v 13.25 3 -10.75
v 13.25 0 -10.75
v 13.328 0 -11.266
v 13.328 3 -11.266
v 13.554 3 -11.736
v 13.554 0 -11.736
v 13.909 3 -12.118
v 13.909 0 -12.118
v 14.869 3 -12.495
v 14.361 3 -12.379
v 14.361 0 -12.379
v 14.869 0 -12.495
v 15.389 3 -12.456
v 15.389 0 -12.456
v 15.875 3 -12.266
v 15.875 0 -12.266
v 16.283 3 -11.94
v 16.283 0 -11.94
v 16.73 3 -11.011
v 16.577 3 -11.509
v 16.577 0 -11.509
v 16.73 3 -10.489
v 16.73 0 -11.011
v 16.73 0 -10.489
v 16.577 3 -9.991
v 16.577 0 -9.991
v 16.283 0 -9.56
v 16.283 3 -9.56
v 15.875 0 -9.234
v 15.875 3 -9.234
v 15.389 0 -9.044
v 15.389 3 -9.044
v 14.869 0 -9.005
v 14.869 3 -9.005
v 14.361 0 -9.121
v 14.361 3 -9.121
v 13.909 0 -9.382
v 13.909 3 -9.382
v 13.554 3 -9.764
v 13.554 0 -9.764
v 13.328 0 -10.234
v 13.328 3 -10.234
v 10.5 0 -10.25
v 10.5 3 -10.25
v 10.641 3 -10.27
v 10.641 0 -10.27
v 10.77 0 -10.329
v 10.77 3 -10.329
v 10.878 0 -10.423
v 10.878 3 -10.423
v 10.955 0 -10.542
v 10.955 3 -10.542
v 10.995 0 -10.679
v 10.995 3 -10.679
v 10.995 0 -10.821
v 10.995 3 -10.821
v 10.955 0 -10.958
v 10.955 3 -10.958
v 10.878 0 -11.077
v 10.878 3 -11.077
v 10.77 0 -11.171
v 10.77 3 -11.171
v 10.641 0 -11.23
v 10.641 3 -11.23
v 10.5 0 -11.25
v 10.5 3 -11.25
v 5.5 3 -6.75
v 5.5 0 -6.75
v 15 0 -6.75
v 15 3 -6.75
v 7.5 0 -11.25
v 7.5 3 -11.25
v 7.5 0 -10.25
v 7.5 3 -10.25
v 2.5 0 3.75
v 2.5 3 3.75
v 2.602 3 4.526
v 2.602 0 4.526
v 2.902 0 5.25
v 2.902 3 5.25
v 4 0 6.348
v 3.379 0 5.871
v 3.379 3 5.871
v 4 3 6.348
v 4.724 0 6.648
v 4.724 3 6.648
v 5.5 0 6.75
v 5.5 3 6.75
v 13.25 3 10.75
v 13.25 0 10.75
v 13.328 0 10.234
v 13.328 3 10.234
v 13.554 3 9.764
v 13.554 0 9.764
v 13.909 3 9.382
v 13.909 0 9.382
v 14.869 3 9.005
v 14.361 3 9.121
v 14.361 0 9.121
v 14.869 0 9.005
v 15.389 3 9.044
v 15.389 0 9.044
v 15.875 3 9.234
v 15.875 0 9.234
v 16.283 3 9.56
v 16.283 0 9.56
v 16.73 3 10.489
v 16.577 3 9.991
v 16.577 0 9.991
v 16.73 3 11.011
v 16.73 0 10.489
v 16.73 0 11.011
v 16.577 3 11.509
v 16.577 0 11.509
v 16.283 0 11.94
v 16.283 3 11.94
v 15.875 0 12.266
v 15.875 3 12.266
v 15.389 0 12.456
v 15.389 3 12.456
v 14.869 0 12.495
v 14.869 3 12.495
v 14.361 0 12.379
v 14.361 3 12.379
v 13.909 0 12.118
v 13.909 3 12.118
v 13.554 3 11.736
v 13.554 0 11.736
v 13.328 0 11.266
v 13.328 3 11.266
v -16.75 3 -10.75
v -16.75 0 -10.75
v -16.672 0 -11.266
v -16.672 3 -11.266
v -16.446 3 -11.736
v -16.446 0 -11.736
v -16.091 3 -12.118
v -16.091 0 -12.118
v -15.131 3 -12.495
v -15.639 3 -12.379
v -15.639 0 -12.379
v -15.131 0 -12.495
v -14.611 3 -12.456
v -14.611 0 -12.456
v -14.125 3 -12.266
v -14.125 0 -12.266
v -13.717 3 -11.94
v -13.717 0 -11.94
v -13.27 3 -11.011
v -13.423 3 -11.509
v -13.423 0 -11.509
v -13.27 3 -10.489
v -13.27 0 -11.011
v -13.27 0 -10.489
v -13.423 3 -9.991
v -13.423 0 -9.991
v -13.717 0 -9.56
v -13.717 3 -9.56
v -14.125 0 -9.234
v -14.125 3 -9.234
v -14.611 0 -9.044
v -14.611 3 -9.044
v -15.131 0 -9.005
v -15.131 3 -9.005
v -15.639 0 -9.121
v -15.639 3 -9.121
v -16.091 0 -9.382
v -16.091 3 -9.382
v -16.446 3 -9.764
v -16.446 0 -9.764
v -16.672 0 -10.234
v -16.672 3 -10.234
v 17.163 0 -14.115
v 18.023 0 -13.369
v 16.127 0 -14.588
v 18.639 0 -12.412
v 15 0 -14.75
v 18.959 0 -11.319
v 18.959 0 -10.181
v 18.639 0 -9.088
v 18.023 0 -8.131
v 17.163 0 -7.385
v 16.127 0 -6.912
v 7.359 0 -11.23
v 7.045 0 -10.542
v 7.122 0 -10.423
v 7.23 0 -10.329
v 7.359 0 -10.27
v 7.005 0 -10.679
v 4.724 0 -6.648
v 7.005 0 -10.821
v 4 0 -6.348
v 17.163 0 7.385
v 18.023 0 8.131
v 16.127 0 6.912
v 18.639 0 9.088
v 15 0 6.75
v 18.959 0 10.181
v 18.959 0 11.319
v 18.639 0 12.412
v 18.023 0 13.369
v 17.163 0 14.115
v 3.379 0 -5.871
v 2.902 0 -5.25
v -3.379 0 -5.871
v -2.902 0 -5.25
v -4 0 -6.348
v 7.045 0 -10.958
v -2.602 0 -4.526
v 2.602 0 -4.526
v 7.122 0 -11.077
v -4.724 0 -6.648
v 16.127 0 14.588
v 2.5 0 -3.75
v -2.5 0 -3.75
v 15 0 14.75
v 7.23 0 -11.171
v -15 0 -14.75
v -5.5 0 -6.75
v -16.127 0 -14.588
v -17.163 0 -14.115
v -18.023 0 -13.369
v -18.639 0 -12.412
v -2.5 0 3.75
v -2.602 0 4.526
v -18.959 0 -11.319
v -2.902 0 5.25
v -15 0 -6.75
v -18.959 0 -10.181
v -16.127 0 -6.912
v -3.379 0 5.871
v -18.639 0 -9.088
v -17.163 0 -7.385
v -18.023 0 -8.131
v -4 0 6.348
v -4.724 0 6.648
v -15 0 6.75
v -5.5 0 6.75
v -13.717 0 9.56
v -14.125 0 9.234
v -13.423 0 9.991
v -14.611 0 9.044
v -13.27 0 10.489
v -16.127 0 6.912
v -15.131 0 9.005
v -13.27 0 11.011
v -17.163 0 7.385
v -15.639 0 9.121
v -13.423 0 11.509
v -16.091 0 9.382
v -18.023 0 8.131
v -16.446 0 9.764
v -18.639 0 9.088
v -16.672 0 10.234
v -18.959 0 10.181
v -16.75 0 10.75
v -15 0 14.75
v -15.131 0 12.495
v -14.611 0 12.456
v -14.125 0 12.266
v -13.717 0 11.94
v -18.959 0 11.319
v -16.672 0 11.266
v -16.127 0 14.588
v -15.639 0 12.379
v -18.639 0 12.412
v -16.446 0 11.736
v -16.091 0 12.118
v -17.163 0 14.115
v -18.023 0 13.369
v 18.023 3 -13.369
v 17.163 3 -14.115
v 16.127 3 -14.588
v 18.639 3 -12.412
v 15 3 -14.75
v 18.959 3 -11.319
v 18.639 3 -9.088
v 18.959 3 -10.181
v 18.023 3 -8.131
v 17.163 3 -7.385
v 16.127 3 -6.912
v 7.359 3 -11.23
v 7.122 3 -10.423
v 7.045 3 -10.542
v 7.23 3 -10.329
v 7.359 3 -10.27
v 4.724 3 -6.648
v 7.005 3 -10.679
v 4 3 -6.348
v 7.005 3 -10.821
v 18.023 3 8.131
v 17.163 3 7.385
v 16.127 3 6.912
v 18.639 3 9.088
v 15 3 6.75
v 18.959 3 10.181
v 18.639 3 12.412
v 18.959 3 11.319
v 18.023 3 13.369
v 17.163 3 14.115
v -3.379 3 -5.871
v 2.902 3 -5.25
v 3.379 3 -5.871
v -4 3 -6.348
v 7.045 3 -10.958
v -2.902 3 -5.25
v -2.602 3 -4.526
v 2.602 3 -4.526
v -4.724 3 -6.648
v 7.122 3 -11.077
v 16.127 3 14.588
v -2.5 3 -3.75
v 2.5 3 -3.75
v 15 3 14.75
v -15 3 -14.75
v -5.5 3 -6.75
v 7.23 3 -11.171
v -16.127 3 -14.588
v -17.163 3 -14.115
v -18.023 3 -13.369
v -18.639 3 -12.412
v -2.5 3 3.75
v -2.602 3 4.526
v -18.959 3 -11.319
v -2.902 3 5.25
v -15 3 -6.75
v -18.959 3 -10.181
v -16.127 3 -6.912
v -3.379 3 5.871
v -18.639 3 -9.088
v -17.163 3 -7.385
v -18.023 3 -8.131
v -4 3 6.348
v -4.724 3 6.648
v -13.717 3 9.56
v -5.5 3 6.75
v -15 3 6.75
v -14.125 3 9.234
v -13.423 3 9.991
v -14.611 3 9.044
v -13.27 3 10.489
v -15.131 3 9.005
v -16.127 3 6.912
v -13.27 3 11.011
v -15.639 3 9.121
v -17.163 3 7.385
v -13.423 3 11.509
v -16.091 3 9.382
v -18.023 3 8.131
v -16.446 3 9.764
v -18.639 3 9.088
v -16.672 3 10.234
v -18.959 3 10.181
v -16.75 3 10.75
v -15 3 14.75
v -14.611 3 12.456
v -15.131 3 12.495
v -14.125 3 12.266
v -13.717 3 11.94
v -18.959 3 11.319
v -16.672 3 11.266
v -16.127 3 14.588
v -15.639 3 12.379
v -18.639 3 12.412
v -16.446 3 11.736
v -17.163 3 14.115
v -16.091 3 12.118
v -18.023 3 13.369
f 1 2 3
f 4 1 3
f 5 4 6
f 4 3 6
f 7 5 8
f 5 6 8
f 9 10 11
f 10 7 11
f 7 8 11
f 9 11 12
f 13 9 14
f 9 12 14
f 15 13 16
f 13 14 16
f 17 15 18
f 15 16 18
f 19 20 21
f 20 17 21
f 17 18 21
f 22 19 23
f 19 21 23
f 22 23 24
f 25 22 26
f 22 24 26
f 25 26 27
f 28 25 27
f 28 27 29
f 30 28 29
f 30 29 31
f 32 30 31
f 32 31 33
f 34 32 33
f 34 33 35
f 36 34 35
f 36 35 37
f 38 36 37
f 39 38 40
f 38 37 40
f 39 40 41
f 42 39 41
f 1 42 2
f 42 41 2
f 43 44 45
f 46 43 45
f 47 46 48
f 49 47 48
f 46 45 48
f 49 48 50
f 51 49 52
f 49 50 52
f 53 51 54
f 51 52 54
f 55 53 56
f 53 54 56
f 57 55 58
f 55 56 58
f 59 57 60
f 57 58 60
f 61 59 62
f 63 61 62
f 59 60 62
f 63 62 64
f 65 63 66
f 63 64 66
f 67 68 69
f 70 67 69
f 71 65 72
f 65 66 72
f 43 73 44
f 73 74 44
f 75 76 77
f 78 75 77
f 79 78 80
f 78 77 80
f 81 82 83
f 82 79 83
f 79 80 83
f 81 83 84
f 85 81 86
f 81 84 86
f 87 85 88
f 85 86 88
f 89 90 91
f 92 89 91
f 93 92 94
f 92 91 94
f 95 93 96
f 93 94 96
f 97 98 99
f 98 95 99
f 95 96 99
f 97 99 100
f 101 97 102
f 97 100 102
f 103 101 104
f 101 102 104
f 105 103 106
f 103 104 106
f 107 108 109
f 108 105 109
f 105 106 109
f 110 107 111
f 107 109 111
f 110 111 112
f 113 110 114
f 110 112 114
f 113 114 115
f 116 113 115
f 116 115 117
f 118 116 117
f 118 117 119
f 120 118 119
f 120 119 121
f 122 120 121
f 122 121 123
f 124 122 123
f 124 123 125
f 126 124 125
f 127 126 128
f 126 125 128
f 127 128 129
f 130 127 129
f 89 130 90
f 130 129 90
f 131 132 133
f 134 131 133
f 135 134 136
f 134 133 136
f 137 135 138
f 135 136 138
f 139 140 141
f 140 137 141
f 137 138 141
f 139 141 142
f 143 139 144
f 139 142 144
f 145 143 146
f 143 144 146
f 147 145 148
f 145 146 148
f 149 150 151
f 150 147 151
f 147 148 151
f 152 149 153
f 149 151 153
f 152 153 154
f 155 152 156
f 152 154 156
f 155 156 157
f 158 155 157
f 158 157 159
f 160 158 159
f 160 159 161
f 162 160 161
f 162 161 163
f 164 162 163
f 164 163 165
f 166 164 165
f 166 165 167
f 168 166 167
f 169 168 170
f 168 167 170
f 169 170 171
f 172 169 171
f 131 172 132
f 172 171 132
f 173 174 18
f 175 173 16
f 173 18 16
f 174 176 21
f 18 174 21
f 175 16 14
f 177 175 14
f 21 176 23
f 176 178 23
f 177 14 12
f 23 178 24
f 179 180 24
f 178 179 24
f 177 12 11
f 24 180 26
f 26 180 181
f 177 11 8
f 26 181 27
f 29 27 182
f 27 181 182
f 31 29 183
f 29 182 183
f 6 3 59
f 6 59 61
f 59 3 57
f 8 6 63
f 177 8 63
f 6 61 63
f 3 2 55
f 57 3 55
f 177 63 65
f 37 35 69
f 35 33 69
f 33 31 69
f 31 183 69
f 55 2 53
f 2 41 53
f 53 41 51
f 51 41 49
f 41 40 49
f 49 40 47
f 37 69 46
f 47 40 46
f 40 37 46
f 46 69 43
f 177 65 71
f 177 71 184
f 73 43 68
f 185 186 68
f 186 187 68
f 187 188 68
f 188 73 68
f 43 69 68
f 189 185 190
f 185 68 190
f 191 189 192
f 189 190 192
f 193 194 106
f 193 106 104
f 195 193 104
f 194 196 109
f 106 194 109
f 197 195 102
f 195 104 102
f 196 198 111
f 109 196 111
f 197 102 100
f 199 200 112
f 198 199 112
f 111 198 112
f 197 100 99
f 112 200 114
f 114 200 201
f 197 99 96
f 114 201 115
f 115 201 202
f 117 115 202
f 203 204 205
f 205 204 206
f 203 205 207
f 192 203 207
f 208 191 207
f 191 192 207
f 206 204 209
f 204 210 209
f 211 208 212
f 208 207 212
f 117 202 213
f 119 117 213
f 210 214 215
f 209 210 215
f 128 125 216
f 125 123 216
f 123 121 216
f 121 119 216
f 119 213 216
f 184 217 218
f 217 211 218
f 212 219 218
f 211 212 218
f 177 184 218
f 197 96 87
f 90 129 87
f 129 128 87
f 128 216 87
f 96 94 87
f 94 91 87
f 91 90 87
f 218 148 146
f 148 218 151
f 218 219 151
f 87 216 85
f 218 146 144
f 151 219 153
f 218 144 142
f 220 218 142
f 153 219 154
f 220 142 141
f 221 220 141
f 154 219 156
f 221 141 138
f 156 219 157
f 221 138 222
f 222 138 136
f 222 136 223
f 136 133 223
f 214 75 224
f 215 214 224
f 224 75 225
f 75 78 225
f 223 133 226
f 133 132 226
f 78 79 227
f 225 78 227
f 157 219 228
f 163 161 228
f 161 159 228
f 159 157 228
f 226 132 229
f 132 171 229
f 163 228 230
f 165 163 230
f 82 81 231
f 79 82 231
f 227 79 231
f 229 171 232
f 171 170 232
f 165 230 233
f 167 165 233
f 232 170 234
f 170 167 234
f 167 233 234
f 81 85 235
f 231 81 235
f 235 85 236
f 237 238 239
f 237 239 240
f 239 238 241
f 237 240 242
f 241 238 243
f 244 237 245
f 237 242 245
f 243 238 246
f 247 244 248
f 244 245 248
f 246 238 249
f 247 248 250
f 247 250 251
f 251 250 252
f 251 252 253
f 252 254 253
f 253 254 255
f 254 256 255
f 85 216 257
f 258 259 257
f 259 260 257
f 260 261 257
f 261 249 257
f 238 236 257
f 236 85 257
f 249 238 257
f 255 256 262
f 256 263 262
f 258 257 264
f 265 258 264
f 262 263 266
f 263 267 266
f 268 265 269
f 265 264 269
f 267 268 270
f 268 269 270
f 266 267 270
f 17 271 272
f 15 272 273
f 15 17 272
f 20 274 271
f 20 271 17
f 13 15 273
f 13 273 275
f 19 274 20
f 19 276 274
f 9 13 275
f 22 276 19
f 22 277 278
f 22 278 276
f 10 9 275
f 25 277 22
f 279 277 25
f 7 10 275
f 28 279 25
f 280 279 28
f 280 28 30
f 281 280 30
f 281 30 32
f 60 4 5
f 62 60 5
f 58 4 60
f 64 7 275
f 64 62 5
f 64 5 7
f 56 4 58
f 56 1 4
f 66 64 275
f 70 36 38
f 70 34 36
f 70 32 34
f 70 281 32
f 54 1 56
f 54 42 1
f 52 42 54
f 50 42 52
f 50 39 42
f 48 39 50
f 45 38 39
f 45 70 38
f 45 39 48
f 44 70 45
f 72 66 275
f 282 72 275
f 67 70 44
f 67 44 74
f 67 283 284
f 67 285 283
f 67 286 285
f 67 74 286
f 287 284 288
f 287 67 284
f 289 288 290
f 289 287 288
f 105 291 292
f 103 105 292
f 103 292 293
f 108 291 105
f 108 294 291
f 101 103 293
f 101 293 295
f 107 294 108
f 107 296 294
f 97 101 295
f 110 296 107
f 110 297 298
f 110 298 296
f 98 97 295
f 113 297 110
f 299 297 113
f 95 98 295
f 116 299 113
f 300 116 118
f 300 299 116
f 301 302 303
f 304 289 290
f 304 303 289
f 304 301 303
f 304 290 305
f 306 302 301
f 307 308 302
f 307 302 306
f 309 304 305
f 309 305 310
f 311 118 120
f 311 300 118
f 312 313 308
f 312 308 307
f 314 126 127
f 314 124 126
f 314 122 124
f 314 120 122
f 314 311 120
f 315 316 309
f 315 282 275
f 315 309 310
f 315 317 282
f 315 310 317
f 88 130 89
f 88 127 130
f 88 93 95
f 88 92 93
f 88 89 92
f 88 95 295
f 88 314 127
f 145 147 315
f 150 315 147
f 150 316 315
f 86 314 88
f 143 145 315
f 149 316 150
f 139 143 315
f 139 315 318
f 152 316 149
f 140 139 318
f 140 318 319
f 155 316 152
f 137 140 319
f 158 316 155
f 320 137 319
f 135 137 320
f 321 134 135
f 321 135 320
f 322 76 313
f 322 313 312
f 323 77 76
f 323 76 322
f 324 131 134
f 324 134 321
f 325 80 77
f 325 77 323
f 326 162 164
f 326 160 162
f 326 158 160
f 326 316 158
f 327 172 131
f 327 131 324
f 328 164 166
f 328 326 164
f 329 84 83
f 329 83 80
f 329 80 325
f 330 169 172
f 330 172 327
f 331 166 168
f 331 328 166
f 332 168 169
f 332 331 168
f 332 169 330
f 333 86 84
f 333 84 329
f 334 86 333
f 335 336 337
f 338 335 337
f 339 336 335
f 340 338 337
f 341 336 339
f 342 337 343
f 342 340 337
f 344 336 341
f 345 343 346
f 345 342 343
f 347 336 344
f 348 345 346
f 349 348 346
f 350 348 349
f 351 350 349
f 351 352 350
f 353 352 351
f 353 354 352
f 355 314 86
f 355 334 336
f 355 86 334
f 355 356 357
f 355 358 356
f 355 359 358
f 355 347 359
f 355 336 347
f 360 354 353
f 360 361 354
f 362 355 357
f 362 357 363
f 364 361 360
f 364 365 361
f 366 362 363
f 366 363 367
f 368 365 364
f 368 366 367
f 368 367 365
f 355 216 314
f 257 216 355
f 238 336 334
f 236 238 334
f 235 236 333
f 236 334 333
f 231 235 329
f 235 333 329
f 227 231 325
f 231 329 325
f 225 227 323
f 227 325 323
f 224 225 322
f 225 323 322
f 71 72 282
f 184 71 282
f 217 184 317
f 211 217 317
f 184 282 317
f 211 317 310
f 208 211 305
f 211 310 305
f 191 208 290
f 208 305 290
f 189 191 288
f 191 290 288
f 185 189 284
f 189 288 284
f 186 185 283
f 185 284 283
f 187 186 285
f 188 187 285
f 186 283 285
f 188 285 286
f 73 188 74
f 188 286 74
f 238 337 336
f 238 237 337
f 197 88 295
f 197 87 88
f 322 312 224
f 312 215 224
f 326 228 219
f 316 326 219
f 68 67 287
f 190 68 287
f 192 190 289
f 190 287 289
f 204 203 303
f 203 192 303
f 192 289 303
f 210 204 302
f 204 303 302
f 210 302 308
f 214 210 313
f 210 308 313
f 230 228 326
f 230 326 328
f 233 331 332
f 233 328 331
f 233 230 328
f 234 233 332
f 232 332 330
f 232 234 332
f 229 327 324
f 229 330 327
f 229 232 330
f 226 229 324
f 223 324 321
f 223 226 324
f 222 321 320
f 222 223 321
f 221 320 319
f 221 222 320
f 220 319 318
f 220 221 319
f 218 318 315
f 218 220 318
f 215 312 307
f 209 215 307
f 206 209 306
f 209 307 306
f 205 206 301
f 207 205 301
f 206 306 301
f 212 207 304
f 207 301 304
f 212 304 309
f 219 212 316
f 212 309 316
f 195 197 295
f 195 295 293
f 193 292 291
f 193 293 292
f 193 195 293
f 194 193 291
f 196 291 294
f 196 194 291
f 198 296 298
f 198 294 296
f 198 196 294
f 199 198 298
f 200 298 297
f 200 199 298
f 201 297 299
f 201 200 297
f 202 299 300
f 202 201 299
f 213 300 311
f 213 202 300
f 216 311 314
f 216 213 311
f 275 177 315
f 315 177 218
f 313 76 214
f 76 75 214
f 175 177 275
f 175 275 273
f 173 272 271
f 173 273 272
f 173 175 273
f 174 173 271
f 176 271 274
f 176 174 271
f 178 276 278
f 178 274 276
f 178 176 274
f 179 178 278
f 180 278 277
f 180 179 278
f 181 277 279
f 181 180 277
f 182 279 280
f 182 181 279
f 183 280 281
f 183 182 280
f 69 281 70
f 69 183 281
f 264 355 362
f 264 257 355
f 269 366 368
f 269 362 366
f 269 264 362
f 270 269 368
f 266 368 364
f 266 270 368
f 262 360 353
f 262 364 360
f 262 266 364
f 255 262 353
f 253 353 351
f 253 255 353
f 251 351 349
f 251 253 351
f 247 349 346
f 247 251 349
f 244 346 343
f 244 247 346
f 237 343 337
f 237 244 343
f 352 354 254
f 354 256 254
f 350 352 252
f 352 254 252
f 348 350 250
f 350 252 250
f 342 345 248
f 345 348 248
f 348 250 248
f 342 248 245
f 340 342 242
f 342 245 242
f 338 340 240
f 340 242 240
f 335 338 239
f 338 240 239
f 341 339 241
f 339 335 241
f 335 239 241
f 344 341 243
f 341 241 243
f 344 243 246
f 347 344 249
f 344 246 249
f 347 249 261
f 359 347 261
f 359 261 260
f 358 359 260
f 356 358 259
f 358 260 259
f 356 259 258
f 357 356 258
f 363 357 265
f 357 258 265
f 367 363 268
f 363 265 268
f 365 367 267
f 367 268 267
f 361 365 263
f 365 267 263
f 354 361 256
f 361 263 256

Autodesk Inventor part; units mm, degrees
ref_plane "YZ Plane" through (0, 0, 0) normal (1, 0, 0) x (0, 1, 0)
ref_plane "XZ Plane" through (0, 0, 0) normal (0, 1, 0) x (-1, 0, 0)
ref_plane "XY Plane" through (0, 0, 0) normal (0, 0, 1) x (1, 0, 0)
sketch "Эскиз1" plane through (0, 0, 0) normal (0, 1, 0) x (-1, 0, 0)
  circle A0 centre (15, 10.75) radius 1.75
  circle A1 centre (15, -10.75) radius 1.75
  circle A2 centre (-15, 10.75) radius 1.75
  circle A3 centre (-15, -10.75) radius 1.75
  line L0 (15, 10.75) -> (-15, 10.75) construction
  line L1 (15, 6.75) -> (-15, 6.75)
  line L2 (-15, 14.75) -> (15, 14.75)
  arc A4 (15, 6.75) -> (15, 14.75) centre (15, 10.75) ccw
  arc A5 (-15, 14.75) -> (-15, 6.75) centre (-15, 10.75) ccw
  line L3 (15, -10.75) -> (-15, -10.75) construction
  line L4 (15, -6.75) -> (-15, -6.75)
  line L5 (-15, -14.75) -> (15, -14.75)
  arc A6 (15, -14.75) -> (15, -6.75) centre (15, -10.75) ccw
  arc A7 (-15, -6.75) -> (-15, -14.75) centre (-15, -10.75) ccw
  line L6 (-2.5, -6.75) -> (2.5, -6.75)
  line L7 (2.5, -6.75) -> (2.5, 6.75)
  line L8 (2.5, 6.75) -> (-2.5, 6.75)
  line L9 (-2.5, 6.75) -> (-2.5, -6.75)
  line L10 (-2.5, -6.75) -> (2.5, 6.75) construction
  line L11 (2.5, -6.75) -> (-2.5, 6.75) construction
  point P0 (0, 0)
  point P1 (0, 10.75)
  point P2 (0, -10.75)
  dimension "d0" = 3.5
  dimension "d1" = 21.5
  dimension "d2" = 21.5
  dimension "d3" = 30
  dimension "d4" = 30
  dimension "d5" = 0
  dimension "d6" = 0
  dimension "d7" = 15
  dimension "d8" = 10.75
  dimension "d9" = 30
  dimension "d10" = 4
  dimension "d11" = 30
  dimension "d12" = 4
  dimension "d13" = 5
extrude "Выдавливание1" add sketch "Эскиз1" along normal blind 3
fillet "Сопряжение1" radius 3 4 edges at (-2.5, 1.5, -6.75) (-2.5, 1.5, 6.75) (2.5, 1.5, 6.75) (2.5, 1.5, -6.75)
sketch "Эскиз2" plane through (0, 3, 0) normal (0, 1, 0) x (1, 0, 0)
  line L0 (11, 10.75) -> (7, 10.75) construction
  line L1 (10.5, 11.25) -> (7.5, 11.25)
  line L2 (7.5, 10.25) -> (10.5, 10.25)
  arc A0 (10.5, 10.25) -> (10.5, 11.25) centre (10.5, 10.75) ccw
  arc A1 (7.5, 11.25) -> (7.5, 10.25) centre (7.5, 10.75) ccw
  point P0 (0, 0)
  point P1 (9, 10.75)
  point P2 (15, 10.75)
  dimension "d17" = 1
  dimension "d18" = 3
  dimension "d19" = 0
  dimension "d20" = 4
extrude "Выдавливание2" cut sketch "Эскиз2" against normal blind 3
properties part number "Base"
